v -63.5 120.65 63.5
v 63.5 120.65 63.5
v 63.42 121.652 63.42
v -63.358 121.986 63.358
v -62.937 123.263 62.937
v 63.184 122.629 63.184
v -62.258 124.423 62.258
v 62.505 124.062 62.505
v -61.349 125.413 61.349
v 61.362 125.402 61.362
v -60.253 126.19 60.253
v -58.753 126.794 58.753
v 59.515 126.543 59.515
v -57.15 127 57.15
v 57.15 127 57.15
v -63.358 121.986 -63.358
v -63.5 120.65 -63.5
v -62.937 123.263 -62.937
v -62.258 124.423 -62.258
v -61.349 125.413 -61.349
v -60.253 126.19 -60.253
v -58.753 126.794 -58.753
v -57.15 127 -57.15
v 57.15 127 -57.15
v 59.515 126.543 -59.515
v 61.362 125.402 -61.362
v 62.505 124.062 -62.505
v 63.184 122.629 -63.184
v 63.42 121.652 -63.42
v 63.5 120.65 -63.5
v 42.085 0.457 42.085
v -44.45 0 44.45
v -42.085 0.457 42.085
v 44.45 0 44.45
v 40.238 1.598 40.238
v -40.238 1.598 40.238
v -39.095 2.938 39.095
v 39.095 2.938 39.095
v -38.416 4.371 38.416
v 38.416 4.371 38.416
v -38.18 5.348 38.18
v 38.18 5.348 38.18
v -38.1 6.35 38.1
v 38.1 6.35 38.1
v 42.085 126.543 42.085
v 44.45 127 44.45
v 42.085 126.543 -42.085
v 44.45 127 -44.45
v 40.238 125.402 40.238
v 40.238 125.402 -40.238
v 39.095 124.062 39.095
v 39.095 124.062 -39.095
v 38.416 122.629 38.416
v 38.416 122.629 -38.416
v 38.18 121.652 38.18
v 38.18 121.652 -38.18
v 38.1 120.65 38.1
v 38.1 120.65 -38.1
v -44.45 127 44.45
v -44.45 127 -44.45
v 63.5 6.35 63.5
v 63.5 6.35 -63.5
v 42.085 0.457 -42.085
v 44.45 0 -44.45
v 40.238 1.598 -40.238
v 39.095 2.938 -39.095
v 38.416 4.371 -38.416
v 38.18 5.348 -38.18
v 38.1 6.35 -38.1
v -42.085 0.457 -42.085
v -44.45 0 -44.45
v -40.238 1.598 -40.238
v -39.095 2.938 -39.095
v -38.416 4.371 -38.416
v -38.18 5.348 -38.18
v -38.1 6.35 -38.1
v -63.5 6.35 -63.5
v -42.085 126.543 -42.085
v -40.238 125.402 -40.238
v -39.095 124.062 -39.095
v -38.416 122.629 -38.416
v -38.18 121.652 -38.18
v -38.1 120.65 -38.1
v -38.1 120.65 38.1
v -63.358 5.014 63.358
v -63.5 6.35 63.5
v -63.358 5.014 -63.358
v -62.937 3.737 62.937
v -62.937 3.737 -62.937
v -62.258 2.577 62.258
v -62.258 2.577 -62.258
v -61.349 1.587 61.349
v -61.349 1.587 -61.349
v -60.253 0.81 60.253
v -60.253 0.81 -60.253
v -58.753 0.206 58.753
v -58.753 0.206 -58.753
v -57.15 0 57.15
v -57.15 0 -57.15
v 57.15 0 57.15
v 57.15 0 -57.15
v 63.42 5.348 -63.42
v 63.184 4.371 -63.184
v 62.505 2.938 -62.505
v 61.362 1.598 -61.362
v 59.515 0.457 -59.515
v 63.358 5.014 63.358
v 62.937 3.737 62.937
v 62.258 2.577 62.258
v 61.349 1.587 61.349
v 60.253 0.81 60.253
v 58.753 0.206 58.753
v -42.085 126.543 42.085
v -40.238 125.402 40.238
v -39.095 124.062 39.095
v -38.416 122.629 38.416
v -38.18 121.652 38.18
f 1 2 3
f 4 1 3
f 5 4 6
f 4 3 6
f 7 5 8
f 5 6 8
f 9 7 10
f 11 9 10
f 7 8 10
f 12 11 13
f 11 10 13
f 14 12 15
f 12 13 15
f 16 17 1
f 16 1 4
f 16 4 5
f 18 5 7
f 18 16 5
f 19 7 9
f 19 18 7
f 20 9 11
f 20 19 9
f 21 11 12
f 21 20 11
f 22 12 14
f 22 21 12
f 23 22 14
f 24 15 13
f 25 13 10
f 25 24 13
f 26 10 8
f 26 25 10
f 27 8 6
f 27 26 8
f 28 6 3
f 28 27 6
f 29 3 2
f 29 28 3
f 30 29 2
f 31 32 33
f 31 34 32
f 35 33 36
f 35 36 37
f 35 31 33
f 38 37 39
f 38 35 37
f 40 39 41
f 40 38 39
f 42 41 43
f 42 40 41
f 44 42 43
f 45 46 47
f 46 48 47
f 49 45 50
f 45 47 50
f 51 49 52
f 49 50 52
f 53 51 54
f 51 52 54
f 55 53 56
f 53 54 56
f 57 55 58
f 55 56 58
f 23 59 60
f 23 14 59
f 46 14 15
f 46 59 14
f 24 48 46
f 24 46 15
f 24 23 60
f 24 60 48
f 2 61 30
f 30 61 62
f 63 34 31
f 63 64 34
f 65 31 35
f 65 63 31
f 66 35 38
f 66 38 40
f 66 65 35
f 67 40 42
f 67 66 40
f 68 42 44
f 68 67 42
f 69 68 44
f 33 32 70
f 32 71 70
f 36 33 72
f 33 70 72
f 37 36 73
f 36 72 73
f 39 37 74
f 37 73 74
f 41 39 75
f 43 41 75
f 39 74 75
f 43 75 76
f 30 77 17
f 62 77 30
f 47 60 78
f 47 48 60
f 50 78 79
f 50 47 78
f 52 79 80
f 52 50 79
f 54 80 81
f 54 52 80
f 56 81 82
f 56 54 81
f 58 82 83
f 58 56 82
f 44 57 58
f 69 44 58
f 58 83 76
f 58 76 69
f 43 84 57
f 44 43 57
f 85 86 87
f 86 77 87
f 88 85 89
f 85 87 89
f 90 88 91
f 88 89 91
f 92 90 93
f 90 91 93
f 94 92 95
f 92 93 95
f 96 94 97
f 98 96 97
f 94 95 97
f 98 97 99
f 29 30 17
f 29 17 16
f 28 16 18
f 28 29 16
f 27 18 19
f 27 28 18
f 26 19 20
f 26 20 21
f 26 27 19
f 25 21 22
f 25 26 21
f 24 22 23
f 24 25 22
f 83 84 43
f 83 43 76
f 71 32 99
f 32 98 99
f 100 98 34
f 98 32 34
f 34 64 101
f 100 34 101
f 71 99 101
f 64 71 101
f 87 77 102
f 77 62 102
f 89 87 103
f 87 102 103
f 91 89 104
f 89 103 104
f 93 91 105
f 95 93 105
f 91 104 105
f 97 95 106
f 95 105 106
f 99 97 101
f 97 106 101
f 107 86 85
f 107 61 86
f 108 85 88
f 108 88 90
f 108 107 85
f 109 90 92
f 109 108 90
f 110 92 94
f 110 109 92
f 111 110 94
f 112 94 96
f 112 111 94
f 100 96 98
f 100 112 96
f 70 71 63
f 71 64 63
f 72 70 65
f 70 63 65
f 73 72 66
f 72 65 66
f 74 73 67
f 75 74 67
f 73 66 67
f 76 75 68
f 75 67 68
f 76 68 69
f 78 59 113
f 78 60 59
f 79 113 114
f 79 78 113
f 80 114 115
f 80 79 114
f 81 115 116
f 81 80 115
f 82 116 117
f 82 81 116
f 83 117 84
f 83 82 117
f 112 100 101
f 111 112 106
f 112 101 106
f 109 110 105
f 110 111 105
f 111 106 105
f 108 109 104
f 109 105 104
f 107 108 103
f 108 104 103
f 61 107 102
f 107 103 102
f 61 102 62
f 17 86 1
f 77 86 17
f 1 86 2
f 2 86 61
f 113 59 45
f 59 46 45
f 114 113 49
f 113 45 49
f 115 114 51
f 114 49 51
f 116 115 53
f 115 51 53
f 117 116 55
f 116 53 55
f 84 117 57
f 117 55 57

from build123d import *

# Parameters (mm, degrees)
SKETCH1_W               = 127
SKETCH1_H               = 127
BOSS_EXTRUDE1_DEPTH     = 127
SKETCH2_W               = 76.2
SKETCH2_H               = 76.2
CUT_EXTRUDE1_DEPTH      = 1
CUT_EXTRUDE1_DEPTH_BACK = 128
FILLET3_R               = 6.35


with BuildPart() as part:
    # Sketch1 → Boss-Extrude1 (new body)
    with BuildSketch(Plane(origin=(0, 0, 0), x_dir=(1, 0, 0), z_dir=(0, 1, 0))):
        Rectangle(SKETCH1_W, SKETCH1_H)
    extrude(amount=BOSS_EXTRUDE1_DEPTH)

    # Sketch2 → Cut-Extrude1 (cut, two sides)
    with BuildSketch(Plane(origin=(0, 127, 0), x_dir=(1, 0, 0), z_dir=(0, 1, 0))) as cut_extrude1_sk:
        Rectangle(SKETCH2_W, SKETCH2_H)
    extrude(amount=CUT_EXTRUDE1_DEPTH, mode=Mode.SUBTRACT)
    extrude(cut_extrude1_sk.sketch, amount=-CUT_EXTRUDE1_DEPTH_BACK, mode=Mode.SUBTRACT)

    # Fillet3
    fillet3_edges = [part.edges().sort_by_distance(p)[0] for p in [
        (63.5, 127, 0),
        (0, 127, 63.5),
        (38.1, 127, 0),
        (38.1, 0, 0),
        (0, 127, 38.1),
        (0, 0, 38.1),
        (-38.1, 127, 0),
        (-38.1, 0, 0),
        (0, 127, -38.1),
        (0, 0, -38.1),
        (-63.5, 127, 0),
        (0, 0, 63.5),
        (63.5, 0, 0),
        (0, 0, -63.5),
        (-63.5, 0, 0),
        (0, 127, -63.5),
    ]]
    fillet(fillet3_edges, radius=FILLET3_R)


solid = part.part
